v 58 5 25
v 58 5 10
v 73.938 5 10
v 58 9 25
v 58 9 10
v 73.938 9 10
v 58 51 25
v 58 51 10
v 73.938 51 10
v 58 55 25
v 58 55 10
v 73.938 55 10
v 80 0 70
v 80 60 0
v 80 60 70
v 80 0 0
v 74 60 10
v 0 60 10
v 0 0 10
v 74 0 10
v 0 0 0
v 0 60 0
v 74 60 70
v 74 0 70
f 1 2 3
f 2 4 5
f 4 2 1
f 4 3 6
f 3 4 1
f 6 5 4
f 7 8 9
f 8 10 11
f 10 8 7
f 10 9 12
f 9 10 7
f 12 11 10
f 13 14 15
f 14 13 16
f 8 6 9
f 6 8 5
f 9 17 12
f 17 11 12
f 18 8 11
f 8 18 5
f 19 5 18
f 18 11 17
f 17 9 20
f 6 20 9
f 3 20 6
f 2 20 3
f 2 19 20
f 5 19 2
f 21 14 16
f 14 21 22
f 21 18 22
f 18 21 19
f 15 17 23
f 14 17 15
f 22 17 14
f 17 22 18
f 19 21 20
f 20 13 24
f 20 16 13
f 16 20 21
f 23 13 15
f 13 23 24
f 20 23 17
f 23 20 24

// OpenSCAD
$fn = 32;

// ----------------------------------------------------------------------
// Rib bracket: 2-gusset L bracket
// ----------------------------------------------------------------------

// --- parameters (mm) ---
base_l = 80;              // foot length, X
base_w = 60;              // foot width, Y
base_t = 10;              // foot thickness
plate_t = 6;              // upright plate thickness
plate_h = 70;             // overall height
gus_l = 16;               // gusset leg along the foot
gus_h = 16;               // gusset height
gus_t = 4;                // gusset thickness
gus_edge = 5;             // gusset margin from the foot edge
n_gus = 2;                // gusset count

gus_pitch = (base_w - 2 * gus_edge - gus_t) / (n_gus - 1);  // gusset pitch

union() {
  cube([base_l, base_w, base_t]);
  translate([base_l - plate_t, 0, base_t - 1])
    cube([plate_t, base_w, plate_h - base_t + 1]);
  for (i = [0 : n_gus - 1])
    translate([base_l - plate_t - gus_l, gus_edge + i * gus_pitch, base_t - 1])
      rotate([-90, 0, 0])
        linear_extrude(height = gus_t)
          polygon(points = [[0, 0], [gus_l + 1, 0], [0, -gus_h]]);
}
